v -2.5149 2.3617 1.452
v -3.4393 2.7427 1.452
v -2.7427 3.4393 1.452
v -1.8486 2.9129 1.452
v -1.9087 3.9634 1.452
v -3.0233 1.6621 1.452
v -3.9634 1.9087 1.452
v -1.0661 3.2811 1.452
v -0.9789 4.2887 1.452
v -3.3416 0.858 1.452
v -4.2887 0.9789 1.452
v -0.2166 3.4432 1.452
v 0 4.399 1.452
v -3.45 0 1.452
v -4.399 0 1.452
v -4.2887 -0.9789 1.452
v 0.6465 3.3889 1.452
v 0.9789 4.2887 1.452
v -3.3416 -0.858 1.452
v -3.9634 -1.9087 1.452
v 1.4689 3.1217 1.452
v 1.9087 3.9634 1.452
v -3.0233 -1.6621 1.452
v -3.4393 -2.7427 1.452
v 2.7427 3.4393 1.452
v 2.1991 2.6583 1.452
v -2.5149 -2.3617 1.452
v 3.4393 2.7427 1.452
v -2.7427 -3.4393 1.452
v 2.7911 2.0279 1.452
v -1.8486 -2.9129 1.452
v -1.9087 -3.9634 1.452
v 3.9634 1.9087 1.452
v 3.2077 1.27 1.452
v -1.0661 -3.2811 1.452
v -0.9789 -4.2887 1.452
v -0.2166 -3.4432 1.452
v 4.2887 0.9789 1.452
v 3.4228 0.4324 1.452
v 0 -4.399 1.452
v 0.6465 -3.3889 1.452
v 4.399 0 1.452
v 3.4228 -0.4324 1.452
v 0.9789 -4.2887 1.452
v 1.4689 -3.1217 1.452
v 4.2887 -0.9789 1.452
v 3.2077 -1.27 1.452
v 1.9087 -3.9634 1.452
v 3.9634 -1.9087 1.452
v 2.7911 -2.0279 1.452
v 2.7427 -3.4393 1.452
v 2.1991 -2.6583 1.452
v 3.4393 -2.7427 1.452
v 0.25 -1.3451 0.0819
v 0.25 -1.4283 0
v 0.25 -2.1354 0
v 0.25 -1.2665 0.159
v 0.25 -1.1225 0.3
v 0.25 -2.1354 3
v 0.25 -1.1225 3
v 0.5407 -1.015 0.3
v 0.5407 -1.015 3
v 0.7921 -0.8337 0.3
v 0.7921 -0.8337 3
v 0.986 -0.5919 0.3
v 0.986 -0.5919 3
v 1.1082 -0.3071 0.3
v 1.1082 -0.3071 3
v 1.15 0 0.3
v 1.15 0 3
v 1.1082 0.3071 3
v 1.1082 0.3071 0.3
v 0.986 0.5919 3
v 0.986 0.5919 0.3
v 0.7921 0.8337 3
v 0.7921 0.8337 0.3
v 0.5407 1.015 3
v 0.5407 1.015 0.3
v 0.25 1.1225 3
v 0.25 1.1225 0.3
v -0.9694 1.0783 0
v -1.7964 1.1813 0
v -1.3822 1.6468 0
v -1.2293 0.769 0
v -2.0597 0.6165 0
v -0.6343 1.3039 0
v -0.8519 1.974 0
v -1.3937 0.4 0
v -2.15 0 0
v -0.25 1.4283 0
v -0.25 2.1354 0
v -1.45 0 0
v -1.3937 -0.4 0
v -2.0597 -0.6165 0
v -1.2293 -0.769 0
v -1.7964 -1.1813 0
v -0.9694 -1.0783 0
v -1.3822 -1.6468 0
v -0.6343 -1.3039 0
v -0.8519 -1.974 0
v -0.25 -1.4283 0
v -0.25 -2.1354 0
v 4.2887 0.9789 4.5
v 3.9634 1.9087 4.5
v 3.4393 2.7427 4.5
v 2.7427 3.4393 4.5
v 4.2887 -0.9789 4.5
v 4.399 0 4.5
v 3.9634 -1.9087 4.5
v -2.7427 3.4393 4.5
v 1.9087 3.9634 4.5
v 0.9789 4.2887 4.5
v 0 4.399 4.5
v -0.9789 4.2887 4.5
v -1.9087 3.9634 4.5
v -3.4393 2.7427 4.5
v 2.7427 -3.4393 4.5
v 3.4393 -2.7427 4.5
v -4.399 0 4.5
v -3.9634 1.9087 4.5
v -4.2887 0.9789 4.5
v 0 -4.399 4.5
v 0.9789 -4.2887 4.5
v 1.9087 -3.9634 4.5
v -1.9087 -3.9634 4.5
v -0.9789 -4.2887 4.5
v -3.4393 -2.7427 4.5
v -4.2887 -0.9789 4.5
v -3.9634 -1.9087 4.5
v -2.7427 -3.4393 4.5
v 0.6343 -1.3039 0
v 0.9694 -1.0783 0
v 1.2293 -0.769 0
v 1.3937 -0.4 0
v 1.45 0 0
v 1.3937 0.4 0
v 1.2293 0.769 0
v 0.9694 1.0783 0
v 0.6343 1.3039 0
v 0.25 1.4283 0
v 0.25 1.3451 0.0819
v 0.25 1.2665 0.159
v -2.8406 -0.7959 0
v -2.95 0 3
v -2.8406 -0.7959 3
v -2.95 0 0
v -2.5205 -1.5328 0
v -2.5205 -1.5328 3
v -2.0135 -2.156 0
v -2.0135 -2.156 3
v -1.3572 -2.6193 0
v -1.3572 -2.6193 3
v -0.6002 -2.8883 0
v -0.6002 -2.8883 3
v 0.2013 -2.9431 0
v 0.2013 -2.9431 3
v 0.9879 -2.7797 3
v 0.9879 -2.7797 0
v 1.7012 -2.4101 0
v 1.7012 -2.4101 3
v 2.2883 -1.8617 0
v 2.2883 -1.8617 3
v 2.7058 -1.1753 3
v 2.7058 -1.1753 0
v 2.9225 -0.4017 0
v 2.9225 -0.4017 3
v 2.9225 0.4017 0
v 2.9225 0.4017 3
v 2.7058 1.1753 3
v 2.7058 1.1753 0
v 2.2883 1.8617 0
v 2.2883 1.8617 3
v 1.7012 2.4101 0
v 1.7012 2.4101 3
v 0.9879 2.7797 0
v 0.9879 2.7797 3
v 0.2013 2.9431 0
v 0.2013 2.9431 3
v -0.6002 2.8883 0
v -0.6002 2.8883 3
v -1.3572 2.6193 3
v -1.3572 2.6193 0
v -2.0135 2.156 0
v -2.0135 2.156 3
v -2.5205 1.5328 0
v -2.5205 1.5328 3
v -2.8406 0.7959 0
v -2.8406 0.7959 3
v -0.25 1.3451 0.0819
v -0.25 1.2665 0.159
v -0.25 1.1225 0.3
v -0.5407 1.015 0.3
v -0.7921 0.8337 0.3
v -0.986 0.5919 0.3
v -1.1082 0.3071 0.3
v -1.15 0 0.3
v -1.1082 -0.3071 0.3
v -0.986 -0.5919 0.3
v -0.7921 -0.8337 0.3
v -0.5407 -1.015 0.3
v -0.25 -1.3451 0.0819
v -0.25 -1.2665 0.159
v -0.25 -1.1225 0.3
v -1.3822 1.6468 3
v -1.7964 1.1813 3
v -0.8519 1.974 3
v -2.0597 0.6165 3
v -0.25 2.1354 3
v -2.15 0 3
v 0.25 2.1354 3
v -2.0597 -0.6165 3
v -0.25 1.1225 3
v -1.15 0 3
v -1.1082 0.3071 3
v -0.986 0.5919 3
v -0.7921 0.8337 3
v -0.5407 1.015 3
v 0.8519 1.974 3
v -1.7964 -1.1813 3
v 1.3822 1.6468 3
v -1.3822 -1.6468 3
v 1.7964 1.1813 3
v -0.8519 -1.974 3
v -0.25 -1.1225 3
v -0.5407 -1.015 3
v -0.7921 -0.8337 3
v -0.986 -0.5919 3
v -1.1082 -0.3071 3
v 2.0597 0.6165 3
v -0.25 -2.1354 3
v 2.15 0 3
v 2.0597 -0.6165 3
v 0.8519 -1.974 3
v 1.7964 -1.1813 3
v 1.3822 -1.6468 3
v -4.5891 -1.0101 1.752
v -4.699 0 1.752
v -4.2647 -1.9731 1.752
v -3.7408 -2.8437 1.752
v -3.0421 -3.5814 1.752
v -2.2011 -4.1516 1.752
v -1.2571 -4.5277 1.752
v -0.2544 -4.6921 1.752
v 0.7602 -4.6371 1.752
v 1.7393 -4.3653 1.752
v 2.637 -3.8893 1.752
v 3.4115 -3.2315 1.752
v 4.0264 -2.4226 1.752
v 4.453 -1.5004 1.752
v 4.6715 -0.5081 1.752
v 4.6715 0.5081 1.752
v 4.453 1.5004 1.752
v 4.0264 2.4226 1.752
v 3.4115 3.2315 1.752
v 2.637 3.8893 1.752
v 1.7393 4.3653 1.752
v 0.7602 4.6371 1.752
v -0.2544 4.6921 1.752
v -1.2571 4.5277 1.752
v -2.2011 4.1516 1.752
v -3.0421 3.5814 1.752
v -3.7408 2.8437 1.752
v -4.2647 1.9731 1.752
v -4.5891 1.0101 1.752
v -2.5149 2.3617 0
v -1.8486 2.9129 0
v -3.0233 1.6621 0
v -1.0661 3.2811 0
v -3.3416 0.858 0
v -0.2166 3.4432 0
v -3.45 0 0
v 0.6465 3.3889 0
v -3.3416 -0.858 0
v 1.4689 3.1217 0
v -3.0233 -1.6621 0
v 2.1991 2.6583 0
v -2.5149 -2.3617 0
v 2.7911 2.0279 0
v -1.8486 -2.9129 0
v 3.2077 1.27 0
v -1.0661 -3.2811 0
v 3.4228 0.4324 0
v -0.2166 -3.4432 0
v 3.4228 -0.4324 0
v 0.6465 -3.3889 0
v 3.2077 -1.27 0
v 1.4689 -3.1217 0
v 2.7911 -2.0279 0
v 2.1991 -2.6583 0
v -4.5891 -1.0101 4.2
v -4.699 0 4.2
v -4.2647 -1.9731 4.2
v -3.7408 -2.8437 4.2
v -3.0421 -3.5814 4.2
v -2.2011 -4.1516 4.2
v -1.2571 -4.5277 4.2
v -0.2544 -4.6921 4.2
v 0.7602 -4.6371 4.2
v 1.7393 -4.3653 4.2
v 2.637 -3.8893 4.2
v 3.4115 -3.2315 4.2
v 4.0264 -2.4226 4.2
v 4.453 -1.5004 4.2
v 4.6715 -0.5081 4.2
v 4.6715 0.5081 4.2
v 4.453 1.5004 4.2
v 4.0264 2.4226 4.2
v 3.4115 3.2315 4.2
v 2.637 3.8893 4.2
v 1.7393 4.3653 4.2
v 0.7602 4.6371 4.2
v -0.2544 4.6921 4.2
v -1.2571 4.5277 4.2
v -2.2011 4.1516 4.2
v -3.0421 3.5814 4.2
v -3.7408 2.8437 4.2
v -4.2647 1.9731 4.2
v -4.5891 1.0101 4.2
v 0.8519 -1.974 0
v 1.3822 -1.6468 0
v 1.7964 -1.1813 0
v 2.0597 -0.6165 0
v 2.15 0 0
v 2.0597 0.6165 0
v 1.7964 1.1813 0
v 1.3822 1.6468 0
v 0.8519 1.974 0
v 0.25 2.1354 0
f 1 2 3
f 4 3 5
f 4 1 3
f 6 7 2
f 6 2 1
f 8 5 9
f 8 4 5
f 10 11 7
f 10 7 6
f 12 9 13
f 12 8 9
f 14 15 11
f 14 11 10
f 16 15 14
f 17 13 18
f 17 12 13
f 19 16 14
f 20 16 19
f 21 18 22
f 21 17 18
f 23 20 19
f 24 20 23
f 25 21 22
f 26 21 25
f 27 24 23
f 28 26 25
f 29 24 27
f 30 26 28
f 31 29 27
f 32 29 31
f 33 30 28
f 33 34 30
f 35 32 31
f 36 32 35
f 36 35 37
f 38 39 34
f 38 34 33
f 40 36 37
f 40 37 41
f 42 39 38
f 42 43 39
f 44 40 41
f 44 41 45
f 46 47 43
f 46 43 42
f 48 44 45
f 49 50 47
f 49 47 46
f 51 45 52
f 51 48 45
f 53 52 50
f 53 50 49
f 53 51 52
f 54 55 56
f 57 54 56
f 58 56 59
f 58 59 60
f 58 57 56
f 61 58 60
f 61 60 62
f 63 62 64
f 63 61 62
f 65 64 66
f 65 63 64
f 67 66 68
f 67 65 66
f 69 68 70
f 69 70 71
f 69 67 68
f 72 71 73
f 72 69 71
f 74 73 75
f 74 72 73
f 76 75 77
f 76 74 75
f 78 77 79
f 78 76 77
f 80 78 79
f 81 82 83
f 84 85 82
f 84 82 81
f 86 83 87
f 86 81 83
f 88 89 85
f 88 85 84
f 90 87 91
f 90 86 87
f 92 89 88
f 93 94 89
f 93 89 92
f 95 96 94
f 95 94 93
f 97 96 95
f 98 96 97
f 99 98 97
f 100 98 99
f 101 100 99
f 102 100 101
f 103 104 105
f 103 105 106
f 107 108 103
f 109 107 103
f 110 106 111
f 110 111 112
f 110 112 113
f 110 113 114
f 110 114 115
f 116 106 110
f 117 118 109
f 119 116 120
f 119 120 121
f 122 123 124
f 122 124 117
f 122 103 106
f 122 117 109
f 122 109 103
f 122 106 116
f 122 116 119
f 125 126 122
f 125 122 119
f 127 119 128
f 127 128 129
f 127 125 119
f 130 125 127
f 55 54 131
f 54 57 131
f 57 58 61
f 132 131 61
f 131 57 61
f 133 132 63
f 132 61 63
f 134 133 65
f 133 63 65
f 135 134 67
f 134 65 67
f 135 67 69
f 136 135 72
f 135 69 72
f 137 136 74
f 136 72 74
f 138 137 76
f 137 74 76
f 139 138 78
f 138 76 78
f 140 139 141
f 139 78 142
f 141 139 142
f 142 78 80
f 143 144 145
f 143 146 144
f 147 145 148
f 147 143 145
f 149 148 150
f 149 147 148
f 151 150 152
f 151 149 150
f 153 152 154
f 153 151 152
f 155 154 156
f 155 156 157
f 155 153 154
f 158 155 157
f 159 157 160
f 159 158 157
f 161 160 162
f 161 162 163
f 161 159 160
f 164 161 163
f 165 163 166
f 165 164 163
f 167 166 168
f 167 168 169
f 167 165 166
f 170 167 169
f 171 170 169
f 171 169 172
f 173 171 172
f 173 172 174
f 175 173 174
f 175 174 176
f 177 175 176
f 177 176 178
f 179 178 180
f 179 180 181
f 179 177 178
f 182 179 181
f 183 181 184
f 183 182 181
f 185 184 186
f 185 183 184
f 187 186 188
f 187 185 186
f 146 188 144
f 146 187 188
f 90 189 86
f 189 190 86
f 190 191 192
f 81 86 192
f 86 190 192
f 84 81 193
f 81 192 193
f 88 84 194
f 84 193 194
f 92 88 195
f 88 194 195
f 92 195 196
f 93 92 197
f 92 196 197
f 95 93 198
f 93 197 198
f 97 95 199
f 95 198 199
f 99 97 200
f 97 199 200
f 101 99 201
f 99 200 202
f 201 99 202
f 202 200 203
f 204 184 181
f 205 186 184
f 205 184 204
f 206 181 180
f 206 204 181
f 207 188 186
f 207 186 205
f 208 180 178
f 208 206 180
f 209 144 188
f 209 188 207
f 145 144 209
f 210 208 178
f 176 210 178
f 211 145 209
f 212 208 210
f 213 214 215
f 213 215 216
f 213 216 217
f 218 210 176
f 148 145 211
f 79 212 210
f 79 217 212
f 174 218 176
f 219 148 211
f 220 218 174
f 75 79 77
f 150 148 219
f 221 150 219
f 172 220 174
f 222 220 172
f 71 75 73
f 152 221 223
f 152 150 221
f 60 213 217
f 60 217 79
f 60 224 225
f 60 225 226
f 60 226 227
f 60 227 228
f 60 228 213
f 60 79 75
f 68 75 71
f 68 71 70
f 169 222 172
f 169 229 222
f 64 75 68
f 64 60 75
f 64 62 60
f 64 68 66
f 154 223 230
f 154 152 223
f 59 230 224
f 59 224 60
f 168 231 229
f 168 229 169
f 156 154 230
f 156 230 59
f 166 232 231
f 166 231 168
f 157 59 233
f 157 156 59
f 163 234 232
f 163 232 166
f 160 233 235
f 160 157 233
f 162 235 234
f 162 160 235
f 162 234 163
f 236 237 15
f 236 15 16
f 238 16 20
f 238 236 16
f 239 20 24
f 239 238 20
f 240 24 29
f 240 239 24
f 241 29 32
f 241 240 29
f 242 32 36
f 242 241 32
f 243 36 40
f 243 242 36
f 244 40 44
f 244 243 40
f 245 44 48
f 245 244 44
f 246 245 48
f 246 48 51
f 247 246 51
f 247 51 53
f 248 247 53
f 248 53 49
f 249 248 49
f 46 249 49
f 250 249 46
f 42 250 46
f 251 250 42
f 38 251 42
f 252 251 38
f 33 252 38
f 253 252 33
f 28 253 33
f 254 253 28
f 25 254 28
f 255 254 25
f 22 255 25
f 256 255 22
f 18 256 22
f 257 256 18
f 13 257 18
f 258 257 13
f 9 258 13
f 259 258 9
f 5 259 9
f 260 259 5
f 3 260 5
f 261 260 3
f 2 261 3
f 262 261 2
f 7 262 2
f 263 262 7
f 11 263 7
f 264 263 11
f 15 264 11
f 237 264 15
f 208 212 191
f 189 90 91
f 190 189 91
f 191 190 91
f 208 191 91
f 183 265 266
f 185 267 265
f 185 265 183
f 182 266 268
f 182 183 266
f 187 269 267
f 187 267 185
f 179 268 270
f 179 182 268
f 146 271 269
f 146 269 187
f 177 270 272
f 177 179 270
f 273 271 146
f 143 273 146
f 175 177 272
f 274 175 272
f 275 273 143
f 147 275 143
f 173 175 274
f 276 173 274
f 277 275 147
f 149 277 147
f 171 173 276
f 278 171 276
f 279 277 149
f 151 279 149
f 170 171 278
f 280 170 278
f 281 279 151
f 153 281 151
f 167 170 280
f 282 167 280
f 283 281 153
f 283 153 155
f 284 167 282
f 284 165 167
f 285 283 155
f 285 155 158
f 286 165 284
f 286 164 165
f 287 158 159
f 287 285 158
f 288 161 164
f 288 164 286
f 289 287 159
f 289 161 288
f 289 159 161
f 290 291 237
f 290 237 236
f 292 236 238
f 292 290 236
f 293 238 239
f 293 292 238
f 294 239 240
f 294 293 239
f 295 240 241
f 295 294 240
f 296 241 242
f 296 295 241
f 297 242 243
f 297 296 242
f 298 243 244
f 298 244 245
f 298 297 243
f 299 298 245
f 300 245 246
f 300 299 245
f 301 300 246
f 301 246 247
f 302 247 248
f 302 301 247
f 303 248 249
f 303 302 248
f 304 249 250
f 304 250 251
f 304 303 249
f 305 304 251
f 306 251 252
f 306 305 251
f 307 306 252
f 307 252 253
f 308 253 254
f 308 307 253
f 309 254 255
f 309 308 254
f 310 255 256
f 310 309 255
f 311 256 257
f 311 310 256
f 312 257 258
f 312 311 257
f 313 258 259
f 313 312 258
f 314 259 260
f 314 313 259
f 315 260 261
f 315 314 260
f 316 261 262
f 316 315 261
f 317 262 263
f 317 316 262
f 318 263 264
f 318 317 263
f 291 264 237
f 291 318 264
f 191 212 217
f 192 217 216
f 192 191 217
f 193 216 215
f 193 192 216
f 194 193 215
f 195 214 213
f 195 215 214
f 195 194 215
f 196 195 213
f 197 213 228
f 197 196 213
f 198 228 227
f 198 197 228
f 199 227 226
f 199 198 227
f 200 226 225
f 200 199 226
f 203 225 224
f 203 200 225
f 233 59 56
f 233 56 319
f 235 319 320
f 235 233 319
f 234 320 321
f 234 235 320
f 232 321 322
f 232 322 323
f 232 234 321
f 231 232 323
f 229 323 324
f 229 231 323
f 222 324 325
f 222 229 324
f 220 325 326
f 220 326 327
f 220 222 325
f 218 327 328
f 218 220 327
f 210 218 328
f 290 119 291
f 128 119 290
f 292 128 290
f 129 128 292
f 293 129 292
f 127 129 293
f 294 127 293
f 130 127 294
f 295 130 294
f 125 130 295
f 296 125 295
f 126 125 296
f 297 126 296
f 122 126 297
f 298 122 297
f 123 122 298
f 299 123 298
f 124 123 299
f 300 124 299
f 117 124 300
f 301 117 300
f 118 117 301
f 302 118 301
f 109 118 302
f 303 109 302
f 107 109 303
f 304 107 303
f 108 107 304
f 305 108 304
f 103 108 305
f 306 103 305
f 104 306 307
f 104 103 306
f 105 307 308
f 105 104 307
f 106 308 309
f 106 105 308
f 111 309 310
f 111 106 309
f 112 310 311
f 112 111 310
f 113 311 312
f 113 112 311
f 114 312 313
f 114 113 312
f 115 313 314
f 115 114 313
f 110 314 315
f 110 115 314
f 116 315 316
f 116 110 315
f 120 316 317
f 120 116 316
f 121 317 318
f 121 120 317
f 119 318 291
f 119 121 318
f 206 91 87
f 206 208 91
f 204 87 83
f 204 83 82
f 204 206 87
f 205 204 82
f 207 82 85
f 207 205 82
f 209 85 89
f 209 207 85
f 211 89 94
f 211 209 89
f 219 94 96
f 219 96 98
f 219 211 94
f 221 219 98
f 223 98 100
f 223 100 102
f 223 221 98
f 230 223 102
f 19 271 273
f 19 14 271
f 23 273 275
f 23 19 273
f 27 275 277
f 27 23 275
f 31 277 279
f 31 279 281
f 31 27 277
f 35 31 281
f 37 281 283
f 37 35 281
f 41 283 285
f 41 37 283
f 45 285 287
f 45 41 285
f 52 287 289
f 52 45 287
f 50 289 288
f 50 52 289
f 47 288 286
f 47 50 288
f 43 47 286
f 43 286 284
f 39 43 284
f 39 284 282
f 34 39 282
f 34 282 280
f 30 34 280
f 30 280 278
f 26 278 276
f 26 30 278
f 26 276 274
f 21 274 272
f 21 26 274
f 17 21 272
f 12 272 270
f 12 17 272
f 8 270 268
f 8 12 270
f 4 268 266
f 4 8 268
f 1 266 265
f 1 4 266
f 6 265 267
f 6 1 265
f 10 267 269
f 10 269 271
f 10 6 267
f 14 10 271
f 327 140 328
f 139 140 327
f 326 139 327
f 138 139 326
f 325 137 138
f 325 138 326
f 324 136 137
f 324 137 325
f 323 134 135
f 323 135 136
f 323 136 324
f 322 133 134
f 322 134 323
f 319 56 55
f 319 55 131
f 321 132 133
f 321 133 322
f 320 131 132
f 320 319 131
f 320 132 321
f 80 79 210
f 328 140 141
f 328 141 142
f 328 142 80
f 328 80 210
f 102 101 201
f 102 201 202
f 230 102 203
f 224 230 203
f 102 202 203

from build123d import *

# Parameters (mm, degrees)
SKETCH012_W     = 0.5
SKETCH012_H     = 5
POCKET002_DEPTH = 3
CHAMFER001_SIZE = 0.3


with BuildPart() as part:
    # Sketch011 → Revolution003 (revolve)
    with BuildSketch(Plane.XZ):
        Polygon((-3.45, 0), (-3.45, 1.452), (-4.699, 1.452), (-4.699, 4.5), (0, 4.5), (0, 3), (-1.15, 3), (-1.15, 0), (-2.15, 0), (-2.15, 3), (-2.95, 3), (-2.95, 0), align=None)
    revolve(axis=Axis((0, 0, 0), (0, 0, 1)))

    # Sketch012 → Pocket002 (cut)
    with BuildSketch(Plane.XY):
        Rectangle(SKETCH012_W, SKETCH012_H)
    extrude(amount=POCKET002_DEPTH, mode=Mode.SUBTRACT)

    # Chamfer001
    chamfer001_edges = [part.edges().sort_by_distance(p)[0] for p in [
        (4.699, 0, 4.5),
        (4.699, 0, 1.452),
        (1.15, 0, 0),
        (-0.897218, 0.719375, 0),
    ]]
    chamfer(chamfer001_edges, length=CHAMFER001_SIZE)


solid = part.part
